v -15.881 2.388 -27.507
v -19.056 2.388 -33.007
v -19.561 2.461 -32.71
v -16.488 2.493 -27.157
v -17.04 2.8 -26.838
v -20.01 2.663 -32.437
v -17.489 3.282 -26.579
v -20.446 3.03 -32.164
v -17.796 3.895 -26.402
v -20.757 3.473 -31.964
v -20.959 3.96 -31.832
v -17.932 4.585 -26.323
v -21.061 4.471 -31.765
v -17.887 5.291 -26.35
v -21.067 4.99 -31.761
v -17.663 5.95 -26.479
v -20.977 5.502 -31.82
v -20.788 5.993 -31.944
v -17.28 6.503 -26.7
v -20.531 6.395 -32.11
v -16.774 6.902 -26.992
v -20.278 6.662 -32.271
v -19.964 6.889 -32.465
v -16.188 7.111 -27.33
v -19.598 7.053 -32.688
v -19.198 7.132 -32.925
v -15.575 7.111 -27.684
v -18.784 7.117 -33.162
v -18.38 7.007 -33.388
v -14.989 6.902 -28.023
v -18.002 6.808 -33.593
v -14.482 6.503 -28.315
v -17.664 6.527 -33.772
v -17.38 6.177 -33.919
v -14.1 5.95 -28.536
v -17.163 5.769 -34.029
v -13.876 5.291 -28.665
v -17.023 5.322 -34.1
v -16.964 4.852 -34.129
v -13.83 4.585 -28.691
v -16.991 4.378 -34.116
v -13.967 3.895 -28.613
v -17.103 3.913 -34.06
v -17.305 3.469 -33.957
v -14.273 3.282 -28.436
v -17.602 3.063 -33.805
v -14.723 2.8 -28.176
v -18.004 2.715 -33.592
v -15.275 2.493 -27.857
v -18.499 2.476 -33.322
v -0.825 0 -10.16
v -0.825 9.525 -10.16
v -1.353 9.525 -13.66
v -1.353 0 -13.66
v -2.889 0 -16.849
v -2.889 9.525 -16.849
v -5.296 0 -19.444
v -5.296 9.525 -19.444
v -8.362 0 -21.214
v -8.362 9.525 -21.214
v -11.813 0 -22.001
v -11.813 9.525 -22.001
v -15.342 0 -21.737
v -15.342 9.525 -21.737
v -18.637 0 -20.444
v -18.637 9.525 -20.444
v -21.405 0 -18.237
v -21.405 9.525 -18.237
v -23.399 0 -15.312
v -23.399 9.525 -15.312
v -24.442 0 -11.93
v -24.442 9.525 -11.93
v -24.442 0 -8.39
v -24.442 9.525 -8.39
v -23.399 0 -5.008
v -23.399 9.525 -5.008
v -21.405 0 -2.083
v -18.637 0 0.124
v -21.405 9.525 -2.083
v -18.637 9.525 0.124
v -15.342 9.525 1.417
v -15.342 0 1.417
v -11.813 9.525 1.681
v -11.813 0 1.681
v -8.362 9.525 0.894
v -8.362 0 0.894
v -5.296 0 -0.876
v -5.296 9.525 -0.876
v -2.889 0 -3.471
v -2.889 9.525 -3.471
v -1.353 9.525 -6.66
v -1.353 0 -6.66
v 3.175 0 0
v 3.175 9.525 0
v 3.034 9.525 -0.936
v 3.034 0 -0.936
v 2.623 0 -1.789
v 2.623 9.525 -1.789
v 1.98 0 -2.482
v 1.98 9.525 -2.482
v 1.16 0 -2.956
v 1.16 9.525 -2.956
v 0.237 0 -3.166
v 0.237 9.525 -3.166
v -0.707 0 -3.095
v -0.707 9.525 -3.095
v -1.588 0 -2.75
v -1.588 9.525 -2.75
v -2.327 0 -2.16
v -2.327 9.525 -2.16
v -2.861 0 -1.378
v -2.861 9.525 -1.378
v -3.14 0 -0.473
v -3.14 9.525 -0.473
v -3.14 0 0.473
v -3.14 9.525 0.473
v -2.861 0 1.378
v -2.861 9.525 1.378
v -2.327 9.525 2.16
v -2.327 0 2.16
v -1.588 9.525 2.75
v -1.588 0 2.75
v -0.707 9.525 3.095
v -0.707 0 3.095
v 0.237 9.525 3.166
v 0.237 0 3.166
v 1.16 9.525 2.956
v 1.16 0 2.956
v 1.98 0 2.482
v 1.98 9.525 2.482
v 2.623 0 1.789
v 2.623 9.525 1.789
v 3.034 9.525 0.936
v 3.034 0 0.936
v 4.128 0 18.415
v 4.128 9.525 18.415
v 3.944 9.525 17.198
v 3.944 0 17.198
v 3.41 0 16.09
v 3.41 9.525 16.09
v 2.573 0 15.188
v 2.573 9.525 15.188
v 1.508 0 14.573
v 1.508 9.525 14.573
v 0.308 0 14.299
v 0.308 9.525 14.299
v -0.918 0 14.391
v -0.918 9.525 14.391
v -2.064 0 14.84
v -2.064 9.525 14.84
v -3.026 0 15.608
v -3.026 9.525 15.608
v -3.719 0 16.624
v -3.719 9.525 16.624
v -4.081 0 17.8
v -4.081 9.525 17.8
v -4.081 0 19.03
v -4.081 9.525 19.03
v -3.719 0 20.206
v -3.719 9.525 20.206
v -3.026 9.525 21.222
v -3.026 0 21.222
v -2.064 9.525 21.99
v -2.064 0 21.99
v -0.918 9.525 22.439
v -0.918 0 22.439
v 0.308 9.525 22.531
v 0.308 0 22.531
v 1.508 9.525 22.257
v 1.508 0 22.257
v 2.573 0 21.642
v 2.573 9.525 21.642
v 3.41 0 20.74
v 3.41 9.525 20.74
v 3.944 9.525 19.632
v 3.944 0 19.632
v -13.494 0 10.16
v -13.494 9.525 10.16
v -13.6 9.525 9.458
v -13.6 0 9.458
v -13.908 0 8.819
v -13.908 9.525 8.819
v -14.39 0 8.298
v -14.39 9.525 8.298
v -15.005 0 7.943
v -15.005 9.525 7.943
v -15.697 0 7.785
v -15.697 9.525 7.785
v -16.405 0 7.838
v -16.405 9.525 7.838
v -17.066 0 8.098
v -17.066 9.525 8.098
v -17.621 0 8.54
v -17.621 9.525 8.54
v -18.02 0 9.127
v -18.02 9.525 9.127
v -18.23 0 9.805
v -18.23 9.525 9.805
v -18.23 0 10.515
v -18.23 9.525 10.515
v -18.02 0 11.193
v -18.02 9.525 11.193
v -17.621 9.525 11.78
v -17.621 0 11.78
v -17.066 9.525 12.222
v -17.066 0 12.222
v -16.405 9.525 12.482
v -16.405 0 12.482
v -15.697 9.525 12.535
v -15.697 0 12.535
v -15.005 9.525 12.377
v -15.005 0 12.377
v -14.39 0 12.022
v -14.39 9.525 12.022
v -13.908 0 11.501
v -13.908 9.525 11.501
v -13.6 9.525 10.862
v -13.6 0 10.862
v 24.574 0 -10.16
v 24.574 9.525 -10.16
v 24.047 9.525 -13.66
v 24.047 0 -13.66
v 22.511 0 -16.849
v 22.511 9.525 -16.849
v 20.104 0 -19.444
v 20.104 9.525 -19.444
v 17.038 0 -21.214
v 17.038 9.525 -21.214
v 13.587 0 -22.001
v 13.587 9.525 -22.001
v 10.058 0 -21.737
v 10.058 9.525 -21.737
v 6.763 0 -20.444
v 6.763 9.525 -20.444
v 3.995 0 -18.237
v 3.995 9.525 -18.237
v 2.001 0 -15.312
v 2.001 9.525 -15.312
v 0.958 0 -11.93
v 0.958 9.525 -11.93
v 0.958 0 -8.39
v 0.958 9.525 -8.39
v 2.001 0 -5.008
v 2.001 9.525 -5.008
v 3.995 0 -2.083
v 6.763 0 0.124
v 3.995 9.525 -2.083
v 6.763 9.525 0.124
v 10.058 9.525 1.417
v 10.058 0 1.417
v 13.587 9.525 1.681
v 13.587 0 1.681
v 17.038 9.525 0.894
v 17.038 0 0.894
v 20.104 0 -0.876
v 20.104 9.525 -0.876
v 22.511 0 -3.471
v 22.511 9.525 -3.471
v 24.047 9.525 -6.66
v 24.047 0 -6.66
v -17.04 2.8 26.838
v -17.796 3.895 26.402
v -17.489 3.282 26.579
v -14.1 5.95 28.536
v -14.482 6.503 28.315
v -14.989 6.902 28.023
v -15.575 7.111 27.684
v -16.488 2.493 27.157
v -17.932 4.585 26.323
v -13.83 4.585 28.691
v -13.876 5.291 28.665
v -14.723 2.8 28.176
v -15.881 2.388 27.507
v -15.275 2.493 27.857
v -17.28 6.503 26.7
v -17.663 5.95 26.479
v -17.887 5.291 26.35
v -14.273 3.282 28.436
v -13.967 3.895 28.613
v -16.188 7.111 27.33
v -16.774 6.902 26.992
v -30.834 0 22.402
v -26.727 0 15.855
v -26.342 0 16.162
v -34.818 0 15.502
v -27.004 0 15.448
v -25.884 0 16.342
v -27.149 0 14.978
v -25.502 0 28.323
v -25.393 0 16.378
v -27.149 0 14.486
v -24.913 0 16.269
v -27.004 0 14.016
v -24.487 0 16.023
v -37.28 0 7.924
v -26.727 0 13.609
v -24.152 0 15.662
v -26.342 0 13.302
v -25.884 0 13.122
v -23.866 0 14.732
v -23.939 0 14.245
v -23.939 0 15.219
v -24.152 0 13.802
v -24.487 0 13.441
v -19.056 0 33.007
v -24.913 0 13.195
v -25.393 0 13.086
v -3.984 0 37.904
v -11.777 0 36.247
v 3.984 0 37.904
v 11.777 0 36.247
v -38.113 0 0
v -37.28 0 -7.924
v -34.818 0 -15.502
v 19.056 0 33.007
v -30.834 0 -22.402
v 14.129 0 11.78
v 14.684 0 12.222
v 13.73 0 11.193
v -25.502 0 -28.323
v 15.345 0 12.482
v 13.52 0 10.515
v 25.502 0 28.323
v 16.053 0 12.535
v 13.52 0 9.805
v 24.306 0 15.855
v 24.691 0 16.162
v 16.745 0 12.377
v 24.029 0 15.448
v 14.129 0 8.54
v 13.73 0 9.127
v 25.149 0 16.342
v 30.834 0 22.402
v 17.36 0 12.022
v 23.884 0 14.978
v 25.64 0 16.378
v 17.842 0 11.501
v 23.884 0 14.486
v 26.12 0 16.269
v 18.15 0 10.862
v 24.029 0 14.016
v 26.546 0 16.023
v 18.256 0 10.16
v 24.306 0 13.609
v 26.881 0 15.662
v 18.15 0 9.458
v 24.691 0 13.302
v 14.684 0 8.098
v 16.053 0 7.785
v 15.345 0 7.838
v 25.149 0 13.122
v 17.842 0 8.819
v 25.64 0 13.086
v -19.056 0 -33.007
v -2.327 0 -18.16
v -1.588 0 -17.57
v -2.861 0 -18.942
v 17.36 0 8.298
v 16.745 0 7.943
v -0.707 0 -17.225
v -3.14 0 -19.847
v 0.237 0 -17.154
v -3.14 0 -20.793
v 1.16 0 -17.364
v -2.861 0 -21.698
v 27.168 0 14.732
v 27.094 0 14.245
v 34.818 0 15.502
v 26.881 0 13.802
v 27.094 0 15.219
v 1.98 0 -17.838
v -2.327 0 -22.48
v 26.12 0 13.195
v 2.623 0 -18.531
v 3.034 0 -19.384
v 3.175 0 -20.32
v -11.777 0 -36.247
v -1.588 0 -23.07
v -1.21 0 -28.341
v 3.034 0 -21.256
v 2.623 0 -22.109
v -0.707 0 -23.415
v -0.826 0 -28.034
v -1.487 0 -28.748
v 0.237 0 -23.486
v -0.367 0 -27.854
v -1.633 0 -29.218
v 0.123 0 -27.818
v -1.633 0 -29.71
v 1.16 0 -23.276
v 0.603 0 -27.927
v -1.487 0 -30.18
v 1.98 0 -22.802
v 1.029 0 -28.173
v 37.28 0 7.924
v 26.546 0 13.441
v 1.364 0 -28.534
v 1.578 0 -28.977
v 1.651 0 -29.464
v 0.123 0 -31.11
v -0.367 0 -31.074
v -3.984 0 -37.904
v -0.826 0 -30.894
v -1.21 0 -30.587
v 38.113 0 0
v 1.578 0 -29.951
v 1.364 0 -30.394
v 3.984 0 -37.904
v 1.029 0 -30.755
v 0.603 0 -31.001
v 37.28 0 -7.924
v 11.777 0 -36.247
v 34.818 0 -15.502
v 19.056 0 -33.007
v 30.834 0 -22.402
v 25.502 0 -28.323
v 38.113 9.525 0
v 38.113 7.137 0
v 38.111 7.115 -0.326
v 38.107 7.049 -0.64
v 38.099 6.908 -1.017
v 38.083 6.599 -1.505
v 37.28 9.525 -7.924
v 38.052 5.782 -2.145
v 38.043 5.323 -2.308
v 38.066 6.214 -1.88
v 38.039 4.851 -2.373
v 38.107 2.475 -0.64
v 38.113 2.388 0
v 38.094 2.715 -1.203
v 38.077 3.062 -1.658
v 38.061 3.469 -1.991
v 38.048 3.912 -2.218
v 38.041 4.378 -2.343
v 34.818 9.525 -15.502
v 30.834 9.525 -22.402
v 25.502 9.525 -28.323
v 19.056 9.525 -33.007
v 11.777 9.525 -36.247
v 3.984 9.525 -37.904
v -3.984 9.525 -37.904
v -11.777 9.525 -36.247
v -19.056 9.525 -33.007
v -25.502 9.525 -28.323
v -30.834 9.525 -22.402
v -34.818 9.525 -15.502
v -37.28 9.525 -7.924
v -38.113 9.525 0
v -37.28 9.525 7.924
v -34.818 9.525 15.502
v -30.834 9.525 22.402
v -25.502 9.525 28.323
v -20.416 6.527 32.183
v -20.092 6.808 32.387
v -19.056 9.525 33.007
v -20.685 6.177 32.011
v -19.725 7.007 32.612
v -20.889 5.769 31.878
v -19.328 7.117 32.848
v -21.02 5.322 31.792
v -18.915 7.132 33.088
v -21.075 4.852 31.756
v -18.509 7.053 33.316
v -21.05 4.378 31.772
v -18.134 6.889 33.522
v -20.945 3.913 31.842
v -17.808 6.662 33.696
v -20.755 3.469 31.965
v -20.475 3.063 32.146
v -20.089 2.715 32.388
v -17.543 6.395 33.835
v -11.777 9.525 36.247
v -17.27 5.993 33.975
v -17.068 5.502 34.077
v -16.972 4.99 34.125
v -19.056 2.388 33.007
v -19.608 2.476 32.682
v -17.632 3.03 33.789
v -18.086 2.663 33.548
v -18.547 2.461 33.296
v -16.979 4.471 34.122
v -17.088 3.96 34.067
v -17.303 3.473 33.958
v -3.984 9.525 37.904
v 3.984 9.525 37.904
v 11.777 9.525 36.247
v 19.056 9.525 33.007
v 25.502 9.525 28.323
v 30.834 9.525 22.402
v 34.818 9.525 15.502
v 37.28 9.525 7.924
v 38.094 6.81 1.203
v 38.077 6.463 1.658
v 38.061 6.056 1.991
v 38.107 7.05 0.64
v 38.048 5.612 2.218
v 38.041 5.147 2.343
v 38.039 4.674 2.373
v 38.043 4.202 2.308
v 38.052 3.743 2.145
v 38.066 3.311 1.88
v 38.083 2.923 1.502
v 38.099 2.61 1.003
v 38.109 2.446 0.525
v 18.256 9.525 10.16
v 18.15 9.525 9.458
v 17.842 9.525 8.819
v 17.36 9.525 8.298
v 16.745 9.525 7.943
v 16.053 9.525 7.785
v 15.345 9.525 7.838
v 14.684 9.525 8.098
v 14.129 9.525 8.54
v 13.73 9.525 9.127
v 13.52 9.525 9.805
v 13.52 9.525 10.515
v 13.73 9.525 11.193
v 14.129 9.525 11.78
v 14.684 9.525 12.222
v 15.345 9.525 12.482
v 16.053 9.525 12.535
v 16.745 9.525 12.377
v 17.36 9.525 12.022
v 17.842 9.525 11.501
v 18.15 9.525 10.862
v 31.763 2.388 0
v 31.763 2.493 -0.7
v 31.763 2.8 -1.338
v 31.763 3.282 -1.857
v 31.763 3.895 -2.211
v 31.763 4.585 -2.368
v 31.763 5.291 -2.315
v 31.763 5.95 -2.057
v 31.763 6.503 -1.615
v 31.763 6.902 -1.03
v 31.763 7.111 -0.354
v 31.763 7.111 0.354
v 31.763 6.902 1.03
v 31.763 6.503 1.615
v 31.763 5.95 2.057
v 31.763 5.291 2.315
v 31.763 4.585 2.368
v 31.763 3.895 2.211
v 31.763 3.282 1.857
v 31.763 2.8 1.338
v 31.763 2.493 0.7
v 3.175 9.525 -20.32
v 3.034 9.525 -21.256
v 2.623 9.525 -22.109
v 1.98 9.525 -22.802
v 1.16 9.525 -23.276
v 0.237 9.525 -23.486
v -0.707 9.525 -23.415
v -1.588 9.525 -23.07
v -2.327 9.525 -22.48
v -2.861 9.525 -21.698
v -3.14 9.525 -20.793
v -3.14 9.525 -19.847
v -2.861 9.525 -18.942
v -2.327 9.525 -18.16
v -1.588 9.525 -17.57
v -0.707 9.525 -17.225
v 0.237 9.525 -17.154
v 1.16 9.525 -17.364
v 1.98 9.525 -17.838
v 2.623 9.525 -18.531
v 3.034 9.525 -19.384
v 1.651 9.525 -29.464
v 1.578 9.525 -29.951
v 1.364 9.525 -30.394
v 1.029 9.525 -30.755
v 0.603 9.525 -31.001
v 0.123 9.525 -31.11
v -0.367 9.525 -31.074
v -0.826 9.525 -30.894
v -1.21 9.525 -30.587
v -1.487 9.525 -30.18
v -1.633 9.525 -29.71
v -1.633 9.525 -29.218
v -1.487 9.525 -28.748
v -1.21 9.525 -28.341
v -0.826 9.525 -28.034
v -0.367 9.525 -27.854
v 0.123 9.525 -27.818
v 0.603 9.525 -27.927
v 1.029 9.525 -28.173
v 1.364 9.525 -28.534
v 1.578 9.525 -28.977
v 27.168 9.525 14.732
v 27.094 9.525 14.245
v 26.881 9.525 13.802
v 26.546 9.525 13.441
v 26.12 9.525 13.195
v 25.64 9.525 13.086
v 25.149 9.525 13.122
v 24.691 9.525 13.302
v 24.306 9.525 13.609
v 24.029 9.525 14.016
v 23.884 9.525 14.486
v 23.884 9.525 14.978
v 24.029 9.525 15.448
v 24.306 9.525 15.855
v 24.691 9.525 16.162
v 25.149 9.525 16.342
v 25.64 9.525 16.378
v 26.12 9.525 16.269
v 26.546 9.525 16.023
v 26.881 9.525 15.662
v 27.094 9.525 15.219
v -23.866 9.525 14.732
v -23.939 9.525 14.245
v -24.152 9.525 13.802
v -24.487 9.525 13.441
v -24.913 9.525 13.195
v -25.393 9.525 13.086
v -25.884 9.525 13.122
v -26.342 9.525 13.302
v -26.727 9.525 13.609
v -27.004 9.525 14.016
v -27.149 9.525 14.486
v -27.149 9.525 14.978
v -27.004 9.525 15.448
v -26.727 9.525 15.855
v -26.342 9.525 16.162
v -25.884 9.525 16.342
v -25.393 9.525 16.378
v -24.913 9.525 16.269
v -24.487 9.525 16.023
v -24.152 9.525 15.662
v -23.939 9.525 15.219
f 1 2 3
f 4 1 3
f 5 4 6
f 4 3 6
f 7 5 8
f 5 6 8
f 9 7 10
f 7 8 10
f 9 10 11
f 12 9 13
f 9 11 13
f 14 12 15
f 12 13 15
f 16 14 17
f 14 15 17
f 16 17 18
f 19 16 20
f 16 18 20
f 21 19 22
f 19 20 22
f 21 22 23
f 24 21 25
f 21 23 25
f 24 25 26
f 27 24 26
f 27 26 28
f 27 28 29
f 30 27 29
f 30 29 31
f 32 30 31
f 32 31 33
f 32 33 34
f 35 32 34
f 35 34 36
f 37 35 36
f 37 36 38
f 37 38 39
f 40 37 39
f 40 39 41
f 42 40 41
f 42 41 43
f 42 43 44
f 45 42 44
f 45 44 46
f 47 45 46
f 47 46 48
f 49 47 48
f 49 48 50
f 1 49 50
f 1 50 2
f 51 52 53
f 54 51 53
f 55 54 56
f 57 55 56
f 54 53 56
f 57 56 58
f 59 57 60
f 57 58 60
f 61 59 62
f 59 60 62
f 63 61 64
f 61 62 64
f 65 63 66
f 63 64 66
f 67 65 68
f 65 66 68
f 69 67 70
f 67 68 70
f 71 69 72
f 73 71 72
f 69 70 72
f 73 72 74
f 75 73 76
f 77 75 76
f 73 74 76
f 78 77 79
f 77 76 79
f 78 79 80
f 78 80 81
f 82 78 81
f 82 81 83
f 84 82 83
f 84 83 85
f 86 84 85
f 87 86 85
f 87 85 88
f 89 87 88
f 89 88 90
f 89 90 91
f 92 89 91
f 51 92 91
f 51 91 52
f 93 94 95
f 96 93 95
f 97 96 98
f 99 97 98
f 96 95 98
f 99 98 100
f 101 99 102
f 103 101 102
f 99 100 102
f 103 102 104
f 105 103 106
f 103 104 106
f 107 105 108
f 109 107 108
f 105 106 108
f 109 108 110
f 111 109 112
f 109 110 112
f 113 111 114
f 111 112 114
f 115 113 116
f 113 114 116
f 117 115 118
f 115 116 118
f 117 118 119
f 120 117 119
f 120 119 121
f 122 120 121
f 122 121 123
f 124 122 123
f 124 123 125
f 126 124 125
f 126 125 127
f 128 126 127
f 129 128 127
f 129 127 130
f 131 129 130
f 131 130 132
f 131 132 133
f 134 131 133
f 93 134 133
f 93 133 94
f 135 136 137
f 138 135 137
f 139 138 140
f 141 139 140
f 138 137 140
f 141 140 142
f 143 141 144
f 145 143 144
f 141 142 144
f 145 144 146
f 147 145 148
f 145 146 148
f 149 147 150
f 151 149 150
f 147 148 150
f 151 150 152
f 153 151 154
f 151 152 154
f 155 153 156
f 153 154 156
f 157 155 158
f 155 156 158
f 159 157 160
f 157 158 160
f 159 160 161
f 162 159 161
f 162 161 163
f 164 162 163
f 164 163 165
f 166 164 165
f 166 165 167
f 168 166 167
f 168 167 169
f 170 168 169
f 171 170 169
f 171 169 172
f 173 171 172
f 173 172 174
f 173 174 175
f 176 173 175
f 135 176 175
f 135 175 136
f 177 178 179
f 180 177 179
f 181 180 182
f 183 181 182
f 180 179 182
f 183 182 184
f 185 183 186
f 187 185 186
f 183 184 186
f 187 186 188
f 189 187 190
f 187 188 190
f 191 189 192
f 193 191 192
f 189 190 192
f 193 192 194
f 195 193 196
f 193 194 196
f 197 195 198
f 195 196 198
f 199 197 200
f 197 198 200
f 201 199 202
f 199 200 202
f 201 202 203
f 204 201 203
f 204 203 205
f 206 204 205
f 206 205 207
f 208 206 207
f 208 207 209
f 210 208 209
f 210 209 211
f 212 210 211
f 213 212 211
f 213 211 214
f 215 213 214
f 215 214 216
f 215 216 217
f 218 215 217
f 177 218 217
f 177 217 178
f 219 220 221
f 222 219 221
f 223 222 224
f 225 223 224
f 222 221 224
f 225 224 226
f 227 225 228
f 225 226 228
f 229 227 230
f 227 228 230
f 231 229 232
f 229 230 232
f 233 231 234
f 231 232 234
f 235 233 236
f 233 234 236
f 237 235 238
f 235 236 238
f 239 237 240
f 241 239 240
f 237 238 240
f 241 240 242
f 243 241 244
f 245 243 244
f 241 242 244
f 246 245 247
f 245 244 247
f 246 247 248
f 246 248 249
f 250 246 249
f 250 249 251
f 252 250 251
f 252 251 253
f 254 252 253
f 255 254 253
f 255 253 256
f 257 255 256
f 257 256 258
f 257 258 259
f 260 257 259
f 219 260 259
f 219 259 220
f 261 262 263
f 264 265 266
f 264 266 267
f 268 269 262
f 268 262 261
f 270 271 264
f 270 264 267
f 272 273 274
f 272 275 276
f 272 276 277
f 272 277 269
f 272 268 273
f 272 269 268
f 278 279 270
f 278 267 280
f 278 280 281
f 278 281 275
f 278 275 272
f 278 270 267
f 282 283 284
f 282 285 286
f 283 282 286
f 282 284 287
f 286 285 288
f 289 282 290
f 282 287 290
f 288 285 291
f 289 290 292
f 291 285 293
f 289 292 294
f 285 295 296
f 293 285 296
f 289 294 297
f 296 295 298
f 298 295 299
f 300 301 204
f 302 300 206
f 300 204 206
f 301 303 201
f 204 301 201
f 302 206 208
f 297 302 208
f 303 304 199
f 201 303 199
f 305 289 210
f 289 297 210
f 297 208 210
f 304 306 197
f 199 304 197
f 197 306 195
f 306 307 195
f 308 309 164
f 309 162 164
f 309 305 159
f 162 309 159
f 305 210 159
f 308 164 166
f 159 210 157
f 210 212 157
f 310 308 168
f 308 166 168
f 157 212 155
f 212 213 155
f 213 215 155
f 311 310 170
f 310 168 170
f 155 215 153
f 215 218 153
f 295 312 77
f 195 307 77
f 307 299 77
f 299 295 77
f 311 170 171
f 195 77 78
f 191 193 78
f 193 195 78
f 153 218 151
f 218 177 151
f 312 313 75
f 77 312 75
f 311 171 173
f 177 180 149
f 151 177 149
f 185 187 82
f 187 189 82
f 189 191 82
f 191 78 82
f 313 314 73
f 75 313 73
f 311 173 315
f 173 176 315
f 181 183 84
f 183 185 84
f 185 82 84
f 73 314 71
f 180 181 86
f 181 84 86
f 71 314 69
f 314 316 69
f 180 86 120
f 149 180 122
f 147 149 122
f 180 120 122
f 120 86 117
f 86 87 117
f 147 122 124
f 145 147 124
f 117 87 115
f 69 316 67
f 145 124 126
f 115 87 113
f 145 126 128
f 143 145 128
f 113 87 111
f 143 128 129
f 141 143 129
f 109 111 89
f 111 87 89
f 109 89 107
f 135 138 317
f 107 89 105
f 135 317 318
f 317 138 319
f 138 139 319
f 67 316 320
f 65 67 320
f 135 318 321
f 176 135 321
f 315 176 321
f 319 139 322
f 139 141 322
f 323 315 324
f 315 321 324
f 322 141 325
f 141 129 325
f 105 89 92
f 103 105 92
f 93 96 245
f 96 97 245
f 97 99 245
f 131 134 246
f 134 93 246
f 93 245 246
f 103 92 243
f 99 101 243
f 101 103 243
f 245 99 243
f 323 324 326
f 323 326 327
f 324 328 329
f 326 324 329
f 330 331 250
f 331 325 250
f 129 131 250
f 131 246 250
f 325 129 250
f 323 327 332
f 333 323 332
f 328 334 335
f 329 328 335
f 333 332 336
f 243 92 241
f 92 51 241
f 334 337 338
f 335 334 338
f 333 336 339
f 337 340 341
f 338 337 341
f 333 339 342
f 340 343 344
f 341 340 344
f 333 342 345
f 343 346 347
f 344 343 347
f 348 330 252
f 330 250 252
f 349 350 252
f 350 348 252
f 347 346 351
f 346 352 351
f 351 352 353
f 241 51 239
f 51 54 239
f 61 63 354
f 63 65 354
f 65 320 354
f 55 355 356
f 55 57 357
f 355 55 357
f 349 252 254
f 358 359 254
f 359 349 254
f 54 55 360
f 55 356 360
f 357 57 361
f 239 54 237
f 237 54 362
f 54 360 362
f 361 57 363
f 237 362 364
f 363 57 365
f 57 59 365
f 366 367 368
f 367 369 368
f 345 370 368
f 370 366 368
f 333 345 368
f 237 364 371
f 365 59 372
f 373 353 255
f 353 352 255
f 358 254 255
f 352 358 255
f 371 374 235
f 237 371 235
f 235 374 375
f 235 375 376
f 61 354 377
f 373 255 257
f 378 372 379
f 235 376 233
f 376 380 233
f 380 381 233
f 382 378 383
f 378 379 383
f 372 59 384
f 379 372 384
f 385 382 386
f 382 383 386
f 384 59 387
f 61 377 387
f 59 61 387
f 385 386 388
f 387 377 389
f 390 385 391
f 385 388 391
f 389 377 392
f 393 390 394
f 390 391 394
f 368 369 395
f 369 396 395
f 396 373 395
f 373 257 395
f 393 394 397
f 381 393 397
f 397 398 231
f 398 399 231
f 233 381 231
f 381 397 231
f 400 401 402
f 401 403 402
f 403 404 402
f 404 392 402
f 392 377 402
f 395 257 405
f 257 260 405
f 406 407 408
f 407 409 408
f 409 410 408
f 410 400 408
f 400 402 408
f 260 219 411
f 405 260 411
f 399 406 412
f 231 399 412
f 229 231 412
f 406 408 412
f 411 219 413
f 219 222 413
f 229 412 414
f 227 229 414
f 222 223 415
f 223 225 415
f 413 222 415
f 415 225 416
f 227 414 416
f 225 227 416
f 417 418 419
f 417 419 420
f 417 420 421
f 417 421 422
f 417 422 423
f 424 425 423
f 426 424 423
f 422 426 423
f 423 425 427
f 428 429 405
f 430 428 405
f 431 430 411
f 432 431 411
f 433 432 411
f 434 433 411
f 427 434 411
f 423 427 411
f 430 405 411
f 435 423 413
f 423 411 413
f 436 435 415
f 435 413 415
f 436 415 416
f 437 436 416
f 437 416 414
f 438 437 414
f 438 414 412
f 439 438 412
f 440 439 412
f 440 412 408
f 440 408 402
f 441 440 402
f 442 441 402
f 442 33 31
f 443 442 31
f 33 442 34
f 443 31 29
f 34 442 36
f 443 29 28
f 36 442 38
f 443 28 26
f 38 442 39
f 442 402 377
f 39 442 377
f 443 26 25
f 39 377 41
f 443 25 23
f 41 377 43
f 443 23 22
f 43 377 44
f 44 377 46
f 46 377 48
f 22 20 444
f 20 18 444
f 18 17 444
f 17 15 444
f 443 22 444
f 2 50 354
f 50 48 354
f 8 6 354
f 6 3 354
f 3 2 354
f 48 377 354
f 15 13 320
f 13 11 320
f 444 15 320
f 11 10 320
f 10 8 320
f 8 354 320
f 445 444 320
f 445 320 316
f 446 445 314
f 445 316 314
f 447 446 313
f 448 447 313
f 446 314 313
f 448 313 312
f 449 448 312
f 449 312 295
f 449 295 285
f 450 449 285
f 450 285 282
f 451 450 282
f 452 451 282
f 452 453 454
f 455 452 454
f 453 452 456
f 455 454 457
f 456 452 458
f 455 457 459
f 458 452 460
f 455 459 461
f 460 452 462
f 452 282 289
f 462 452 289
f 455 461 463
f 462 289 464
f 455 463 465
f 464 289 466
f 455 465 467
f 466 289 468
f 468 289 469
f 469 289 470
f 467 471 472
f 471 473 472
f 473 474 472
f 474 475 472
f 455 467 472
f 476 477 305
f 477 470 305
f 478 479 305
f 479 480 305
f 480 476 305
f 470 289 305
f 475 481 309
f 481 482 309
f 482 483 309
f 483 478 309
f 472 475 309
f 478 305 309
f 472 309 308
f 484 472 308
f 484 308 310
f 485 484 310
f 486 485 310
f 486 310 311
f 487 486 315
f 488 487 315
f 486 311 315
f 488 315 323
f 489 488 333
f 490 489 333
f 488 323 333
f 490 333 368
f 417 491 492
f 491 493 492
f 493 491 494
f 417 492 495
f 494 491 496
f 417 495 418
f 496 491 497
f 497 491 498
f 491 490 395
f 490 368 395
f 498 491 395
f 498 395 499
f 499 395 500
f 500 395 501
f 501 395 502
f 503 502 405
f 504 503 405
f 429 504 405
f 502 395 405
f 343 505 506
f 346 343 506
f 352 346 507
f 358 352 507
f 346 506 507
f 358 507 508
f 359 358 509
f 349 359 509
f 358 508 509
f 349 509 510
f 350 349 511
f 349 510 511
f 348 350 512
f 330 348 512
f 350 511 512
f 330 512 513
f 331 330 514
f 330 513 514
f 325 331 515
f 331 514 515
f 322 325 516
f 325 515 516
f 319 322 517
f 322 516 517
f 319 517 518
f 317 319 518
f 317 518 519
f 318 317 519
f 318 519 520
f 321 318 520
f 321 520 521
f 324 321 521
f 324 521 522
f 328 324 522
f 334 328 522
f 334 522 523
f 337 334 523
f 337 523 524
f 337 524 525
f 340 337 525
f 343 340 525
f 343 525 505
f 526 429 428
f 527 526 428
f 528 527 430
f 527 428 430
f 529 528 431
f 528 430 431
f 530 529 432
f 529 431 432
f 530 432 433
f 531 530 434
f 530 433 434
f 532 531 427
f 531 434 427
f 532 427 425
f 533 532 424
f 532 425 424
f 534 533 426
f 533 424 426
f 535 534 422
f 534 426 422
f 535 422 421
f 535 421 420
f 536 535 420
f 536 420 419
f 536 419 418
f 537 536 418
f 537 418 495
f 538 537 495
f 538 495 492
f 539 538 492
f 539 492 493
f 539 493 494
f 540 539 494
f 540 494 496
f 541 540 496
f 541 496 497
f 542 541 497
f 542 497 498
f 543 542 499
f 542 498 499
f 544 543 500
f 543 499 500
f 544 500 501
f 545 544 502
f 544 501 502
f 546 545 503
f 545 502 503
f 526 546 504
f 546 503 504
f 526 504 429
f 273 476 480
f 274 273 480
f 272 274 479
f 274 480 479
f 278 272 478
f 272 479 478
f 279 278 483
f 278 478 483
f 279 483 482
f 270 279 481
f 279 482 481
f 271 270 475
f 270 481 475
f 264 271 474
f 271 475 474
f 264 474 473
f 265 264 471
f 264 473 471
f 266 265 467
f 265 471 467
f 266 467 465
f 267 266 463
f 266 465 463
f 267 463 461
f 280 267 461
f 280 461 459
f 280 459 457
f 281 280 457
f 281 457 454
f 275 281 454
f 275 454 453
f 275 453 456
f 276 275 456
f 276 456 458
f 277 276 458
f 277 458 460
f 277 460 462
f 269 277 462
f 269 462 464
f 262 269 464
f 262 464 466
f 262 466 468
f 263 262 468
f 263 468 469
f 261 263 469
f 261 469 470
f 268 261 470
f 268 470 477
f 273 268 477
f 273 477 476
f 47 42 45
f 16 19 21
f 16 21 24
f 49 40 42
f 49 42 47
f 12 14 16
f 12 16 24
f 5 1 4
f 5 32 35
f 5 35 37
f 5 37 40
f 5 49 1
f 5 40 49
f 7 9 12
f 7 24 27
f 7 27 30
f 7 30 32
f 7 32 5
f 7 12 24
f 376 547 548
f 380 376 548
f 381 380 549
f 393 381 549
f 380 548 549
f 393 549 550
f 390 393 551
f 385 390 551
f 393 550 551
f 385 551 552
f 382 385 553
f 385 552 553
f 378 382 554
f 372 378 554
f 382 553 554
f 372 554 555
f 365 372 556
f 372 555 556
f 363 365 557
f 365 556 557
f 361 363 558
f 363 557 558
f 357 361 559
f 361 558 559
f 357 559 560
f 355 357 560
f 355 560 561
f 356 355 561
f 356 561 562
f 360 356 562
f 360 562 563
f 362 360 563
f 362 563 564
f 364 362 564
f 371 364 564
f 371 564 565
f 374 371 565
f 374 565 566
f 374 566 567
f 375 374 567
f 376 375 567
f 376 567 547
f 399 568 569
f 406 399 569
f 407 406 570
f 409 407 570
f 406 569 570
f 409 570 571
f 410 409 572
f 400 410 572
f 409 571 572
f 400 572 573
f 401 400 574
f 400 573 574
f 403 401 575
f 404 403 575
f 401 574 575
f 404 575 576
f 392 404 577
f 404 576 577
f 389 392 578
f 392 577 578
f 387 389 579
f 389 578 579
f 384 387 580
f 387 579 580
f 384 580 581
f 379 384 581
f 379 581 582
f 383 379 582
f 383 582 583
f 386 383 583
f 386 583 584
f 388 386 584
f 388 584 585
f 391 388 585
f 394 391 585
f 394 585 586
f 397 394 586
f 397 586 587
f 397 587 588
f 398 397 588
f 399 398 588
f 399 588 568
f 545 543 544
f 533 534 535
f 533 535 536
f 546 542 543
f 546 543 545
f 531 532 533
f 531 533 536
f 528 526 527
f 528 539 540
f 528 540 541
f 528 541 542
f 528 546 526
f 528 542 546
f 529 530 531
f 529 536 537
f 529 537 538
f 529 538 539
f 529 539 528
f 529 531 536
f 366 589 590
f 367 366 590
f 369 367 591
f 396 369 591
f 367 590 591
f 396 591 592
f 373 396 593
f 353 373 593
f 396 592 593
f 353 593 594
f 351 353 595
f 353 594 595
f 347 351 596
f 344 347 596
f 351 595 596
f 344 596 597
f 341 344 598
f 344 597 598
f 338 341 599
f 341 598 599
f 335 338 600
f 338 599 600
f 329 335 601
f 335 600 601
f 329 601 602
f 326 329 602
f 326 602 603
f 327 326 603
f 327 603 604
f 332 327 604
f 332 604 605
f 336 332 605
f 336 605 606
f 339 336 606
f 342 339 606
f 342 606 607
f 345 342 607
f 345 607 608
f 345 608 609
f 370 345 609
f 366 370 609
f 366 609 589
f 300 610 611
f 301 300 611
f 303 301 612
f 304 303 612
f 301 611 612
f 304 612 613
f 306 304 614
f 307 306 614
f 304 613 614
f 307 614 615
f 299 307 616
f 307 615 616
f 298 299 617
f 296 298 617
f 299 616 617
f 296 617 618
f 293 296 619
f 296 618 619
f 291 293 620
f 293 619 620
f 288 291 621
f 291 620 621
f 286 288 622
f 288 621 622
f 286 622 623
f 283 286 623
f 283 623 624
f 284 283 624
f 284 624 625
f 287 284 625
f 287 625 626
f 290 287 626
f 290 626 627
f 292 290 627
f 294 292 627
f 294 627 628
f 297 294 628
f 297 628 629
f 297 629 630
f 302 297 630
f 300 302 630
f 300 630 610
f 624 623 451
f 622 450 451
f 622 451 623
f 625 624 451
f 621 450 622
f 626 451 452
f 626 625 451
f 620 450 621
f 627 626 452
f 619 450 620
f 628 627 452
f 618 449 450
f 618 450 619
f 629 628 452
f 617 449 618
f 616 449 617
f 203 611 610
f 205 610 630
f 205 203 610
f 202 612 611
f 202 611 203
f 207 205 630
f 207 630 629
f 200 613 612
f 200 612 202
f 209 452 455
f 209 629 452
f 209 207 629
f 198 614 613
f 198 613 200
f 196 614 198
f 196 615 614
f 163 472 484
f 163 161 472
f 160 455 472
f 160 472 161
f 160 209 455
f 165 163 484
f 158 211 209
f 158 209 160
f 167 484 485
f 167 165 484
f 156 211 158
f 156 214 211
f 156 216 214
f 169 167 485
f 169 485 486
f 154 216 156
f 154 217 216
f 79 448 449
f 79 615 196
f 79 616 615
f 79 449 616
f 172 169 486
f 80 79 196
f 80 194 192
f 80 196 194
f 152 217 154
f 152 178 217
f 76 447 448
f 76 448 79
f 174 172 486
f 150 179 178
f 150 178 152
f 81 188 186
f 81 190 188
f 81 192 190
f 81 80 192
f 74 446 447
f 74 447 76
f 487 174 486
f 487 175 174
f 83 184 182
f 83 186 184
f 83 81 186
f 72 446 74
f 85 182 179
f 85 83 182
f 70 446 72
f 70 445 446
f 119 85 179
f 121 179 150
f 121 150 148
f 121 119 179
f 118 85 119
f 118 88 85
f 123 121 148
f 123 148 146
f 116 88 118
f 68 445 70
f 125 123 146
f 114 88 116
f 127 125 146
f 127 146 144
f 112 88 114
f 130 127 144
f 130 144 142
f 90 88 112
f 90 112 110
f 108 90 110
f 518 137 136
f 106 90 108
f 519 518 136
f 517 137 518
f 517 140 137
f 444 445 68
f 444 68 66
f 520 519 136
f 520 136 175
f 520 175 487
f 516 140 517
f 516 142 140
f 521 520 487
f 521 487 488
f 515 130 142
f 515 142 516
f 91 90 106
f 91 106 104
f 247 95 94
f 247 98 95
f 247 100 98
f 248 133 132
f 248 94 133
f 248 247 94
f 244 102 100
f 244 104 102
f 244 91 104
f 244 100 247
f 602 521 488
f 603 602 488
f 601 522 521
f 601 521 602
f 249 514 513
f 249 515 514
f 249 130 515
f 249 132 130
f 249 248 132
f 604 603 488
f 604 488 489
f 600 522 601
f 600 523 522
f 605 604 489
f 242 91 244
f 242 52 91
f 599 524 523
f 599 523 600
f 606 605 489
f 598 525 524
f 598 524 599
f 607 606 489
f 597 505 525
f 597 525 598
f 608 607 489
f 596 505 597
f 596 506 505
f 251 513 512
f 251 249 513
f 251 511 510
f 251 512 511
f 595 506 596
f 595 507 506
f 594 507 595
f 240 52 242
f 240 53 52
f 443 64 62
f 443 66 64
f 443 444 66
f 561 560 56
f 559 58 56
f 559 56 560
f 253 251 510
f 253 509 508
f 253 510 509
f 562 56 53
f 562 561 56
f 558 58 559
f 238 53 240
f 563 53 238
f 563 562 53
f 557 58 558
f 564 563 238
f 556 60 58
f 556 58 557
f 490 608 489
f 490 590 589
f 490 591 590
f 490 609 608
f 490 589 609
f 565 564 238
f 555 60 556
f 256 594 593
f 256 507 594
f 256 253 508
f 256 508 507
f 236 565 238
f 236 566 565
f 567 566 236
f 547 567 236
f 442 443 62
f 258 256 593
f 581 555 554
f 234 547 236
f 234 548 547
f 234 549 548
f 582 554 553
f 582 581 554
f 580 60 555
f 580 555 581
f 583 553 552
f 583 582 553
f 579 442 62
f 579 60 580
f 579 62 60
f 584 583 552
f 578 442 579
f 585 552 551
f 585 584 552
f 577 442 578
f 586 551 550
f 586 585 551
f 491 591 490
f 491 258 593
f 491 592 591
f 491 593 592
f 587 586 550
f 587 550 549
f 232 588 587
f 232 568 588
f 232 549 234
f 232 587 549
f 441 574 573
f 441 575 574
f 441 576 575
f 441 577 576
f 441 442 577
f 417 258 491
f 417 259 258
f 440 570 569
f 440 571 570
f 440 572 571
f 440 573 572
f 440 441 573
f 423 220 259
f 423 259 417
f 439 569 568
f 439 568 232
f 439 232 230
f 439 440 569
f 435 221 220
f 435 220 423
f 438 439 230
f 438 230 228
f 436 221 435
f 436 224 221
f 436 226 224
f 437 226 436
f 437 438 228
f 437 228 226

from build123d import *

# Parameters (mm, degrees)
SKETCH1_R               = 38.1127
BOSS_EXTRUDE1_DEPTH     = 9.525
SKETCH2_R               = 1.651
SKETCH2_R_2             = 4.1275
SKETCH2_R_3             = 11.8745
SKETCH2_R_4             = 3.175
CUT_EXTRUDE1_DEPTH      = 55.734645587
SKETCH4_R               = 2.3749
CUT_EXTRUDE2_DEPTH      = 6.35
CIRPATTERN1_COUNT       = 3
CUT_EXTRUDE3_DEPTH      = 55.734645744
CUT_EXTRUDE3_DEPTH_BACK = 55.734645744
SKETCH5_R               = 2.38125


with BuildPart() as part:
    # Sketch1 → Boss-Extrude1 (new body)
    with BuildSketch(Plane(origin=(0, 0, 0), x_dir=(1, 0, 0), z_dir=(0, 1, 0))):
        Circle(SKETCH1_R)
    extrude(amount=BOSS_EXTRUDE1_DEPTH)

    # Sketch2 → Cut-Extrude1 (cut, through all)
    with BuildSketch(Plane(origin=(0, 9.525, 0), x_dir=(1, 0, 0), z_dir=(0, 1, 0))):
        with Locations((0, 29.464)):
            Circle(SKETCH2_R)
        with Locations((25.516572497, -14.732)):
            Circle(SKETCH2_R)
        with Locations((-25.516572497, -14.732)):
            Circle(SKETCH2_R)
        with Locations((0, -18.415)):
            Circle(SKETCH2_R_2)
        with Locations((-12.7, 10.16)):
            Circle(SKETCH2_R_3)
        with Locations((12.7, 10.16)):
            Circle(SKETCH2_R_3)
        with Locations((0, 20.32)):
            Circle(SKETCH2_R_4)
        Circle(SKETCH2_R_4)
    extrude(amount=-CUT_EXTRUDE1_DEPTH, mode=Mode.SUBTRACT)

    # Sketch4 → Cut-Extrude2 (cut)
    with BuildSketch(Plane(origin=(-19.05635, 0, -33.006566407), x_dir=(0, -1, 0), z_dir=(-0.499999999999998, 0, -0.8660254037844398))):
        with Locations((-4.7625, 0)):
            Circle(SKETCH4_R)
    cut_extrude2 = extrude(amount=-CUT_EXTRUDE2_DEPTH, mode=Mode.SUBTRACT)

    # CirPattern1: Cut-Extrude2 ×3 about axis
    cirpattern1_axis = Axis((0, 10.00125, 0), (0, -1, 0))
    for i in range(1, CIRPATTERN1_COUNT):
        add(cut_extrude2.rotate(cirpattern1_axis, i * 360 / CIRPATTERN1_COUNT), mode=Mode.SUBTRACT)

    # Sketch5 → Cut-Extrude3 (cut, two sides: drawn at the far end of the back side and taken through both)
    with BuildSketch(Plane(origin=(0, 9.525, 0), x_dir=(1, 0, 0), z_dir=(0, 1, 0)).offset(-CUT_EXTRUDE3_DEPTH_BACK)):
        with Locations((-15.875, -10.16)):
            Circle(SKETCH5_R)
        with Locations((15.875, -10.16)):
            Circle(SKETCH5_R)
    extrude(amount=CUT_EXTRUDE3_DEPTH + CUT_EXTRUDE3_DEPTH_BACK, mode=Mode.SUBTRACT)


solid = part.part
